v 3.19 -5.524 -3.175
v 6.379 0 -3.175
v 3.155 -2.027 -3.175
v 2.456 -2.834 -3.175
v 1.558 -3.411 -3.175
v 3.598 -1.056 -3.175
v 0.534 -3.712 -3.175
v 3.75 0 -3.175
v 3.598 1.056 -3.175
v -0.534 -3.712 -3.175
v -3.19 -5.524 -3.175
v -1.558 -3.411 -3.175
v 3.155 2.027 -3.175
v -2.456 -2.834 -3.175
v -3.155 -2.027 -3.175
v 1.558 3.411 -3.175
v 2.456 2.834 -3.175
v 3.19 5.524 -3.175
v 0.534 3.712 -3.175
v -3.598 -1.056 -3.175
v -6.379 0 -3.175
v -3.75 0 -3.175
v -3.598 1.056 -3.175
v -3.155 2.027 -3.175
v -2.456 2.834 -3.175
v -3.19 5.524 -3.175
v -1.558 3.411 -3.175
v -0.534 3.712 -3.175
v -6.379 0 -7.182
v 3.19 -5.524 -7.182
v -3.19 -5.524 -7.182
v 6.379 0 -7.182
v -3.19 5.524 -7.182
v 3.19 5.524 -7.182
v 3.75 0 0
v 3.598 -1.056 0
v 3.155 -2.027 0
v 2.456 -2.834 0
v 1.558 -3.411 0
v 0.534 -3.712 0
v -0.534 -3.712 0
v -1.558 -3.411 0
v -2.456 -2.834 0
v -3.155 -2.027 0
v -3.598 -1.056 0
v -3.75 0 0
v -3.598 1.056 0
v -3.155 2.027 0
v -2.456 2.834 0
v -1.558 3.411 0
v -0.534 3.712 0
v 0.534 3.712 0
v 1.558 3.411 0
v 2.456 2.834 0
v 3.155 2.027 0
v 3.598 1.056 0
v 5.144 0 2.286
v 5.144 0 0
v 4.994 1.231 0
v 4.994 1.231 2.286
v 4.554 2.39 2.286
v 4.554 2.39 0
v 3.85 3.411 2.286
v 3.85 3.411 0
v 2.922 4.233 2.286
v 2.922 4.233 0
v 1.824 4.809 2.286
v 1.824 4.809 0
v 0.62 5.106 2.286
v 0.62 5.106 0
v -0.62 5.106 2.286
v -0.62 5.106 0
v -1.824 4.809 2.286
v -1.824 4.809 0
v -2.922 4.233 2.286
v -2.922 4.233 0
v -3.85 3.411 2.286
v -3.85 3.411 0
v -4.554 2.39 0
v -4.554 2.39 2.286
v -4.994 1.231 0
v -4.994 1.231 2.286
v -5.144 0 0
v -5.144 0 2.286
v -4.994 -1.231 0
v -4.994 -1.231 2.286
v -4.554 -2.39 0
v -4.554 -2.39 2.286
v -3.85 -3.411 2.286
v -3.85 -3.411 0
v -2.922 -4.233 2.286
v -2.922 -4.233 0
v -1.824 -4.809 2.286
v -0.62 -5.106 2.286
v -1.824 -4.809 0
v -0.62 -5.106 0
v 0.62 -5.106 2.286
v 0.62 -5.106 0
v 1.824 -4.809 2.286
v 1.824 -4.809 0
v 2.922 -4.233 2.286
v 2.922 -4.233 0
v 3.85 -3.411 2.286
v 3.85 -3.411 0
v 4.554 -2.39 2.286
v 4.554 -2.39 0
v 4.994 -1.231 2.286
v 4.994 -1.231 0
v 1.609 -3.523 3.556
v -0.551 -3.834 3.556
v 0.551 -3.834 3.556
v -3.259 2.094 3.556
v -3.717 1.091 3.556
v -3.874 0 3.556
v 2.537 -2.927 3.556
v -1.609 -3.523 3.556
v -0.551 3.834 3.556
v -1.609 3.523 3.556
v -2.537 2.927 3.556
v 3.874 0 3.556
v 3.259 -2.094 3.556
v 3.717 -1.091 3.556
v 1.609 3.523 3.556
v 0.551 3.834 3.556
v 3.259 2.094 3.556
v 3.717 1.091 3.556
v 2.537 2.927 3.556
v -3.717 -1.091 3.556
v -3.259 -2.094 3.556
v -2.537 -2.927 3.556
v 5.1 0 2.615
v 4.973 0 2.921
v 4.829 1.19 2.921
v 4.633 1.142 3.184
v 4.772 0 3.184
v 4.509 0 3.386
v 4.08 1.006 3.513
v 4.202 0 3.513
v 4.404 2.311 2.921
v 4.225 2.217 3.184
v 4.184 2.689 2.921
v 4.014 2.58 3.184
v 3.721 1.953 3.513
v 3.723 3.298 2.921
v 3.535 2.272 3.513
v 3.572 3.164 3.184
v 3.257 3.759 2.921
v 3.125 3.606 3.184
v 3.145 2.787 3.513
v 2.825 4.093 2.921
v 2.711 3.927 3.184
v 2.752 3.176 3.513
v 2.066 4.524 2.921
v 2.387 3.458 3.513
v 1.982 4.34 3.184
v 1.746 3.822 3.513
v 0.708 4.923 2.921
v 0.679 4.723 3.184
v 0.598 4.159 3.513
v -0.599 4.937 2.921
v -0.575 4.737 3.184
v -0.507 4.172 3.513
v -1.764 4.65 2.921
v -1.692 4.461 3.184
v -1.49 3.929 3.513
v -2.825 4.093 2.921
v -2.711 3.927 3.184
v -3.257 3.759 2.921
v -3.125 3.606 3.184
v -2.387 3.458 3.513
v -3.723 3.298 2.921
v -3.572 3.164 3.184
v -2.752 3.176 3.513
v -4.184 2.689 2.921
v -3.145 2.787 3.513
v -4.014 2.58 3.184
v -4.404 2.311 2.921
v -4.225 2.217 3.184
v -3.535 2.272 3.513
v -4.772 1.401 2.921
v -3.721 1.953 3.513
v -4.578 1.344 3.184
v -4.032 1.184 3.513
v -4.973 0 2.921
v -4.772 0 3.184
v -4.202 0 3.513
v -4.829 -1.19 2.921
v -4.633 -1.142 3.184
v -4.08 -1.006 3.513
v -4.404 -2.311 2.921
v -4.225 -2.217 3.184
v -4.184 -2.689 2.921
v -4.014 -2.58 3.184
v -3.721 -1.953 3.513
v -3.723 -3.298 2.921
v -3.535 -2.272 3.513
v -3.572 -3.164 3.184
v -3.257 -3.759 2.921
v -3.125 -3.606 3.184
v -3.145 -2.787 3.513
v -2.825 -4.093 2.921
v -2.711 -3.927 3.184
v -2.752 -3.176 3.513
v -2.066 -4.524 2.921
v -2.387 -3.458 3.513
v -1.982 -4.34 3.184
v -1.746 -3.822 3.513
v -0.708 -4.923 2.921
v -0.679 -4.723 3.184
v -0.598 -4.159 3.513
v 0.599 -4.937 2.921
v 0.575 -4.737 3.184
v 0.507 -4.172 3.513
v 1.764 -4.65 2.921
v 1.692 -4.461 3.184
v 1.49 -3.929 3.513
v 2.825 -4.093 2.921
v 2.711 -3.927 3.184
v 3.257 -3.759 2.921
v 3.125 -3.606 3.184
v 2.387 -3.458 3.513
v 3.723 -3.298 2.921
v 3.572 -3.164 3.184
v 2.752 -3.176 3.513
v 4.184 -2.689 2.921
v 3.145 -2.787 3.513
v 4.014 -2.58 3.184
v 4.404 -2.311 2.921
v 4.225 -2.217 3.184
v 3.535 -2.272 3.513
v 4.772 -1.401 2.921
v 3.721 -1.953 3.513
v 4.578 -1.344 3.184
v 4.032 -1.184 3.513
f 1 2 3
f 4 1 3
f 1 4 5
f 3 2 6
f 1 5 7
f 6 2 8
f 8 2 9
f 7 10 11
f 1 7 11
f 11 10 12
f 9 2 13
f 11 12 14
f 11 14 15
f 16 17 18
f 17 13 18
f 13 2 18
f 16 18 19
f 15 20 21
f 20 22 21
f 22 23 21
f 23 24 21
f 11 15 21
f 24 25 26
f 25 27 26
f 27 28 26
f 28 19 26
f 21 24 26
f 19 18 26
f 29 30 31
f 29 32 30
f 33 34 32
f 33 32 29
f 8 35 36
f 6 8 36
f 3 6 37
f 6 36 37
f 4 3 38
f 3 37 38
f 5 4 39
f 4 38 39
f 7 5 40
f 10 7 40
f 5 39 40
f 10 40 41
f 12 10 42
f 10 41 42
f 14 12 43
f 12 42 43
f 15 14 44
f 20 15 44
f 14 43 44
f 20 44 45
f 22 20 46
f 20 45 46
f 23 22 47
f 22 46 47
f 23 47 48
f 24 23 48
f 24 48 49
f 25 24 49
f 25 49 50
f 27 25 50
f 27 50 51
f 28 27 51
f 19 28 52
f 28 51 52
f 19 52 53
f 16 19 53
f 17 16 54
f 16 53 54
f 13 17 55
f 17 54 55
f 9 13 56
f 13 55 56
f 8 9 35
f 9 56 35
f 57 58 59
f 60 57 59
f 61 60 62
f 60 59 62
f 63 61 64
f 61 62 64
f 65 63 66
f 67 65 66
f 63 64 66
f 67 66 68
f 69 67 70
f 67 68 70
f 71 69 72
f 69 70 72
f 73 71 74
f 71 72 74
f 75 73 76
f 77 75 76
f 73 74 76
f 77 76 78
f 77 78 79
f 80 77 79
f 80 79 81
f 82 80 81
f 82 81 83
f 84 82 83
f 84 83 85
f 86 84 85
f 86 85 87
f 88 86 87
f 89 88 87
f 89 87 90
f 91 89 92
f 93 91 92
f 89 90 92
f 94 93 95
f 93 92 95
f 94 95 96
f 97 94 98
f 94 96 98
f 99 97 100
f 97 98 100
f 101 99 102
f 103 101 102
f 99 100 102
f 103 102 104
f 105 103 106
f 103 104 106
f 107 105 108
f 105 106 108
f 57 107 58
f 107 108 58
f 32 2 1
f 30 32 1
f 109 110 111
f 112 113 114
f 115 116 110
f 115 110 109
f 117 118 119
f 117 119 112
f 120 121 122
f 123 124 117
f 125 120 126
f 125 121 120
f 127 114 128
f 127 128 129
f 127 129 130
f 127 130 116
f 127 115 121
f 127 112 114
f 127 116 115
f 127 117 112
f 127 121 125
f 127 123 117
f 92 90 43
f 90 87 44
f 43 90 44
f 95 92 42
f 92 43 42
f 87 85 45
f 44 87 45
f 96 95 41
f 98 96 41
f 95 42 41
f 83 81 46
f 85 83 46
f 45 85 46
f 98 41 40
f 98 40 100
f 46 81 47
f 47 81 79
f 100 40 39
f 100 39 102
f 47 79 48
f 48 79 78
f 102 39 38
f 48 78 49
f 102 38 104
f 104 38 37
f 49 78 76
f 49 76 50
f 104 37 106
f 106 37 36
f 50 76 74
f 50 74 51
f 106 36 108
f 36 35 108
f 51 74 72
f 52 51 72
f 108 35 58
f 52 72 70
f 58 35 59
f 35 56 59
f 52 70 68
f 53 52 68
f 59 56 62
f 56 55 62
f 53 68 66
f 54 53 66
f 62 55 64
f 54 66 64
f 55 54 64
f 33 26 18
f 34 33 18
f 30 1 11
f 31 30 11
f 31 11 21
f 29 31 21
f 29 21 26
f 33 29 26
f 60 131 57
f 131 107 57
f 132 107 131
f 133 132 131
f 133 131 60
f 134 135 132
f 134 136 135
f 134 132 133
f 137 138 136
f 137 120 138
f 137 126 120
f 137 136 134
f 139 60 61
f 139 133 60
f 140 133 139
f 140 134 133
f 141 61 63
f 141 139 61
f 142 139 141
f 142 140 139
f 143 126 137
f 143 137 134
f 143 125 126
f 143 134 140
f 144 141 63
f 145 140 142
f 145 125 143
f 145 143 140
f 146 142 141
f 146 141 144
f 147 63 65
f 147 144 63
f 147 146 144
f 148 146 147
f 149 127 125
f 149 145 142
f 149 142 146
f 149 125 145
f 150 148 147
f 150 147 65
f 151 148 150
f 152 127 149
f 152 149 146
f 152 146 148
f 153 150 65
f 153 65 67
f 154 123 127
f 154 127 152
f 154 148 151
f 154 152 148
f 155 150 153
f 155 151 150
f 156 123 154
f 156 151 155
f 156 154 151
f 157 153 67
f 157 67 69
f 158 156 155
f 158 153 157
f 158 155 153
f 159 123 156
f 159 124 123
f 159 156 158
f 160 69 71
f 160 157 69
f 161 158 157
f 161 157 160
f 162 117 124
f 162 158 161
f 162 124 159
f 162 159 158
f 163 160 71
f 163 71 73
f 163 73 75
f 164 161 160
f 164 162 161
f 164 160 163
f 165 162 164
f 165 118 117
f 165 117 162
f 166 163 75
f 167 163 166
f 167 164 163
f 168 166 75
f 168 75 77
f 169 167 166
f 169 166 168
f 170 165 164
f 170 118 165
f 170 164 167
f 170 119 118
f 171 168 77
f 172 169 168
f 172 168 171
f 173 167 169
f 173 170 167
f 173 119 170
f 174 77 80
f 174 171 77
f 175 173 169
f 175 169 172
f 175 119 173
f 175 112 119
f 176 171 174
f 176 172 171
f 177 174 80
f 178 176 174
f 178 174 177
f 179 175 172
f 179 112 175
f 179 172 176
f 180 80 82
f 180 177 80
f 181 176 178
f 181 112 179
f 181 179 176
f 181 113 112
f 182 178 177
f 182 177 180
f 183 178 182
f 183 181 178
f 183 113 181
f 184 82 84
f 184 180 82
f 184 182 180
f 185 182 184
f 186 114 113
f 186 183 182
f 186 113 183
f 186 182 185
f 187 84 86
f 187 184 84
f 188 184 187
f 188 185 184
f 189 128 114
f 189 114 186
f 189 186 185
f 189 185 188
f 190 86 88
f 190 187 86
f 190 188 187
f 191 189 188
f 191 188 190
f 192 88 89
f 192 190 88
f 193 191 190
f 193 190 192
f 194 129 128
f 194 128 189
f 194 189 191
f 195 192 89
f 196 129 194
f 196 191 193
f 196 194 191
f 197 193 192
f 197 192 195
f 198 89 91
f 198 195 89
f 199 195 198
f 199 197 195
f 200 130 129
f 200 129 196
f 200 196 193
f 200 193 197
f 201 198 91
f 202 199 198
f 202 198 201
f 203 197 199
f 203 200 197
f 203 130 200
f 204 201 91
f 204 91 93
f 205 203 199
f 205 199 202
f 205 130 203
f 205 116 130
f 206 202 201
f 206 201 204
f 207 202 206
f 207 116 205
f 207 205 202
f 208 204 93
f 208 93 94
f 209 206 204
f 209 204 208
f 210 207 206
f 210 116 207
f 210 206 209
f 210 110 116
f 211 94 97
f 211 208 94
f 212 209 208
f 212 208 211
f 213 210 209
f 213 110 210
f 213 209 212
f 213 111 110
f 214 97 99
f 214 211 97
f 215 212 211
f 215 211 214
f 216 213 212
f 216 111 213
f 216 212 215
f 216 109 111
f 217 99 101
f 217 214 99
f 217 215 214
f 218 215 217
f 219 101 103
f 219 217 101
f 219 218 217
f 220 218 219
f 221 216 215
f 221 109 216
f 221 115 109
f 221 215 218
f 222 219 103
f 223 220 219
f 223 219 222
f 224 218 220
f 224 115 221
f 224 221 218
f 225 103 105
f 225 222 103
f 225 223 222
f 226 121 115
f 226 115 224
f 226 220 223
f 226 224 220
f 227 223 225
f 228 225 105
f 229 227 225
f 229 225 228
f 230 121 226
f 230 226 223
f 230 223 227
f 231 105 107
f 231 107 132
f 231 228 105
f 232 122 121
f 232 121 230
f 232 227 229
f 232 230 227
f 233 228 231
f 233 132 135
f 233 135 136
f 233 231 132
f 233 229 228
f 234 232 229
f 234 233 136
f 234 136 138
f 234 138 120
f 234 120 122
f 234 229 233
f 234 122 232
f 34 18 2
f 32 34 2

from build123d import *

# Parameters (mm, degrees)
SKETCH1_R      = 5.1435
EXTRUDE1_DEPTH = 3.556
SKETCH2_R      = 3.75
EXTRUDE2_DEPTH = 3.175
EXTRUDE3_DEPTH = 4.007423572
FILLET1_R      = 1.27


with BuildPart() as part:
    # Sketch1 → Extrude1 (new body)
    with BuildSketch(Plane.XY):
        Circle(SKETCH1_R)
    extrude(amount=EXTRUDE1_DEPTH)

    # Sketch2 → Extrude2 (add)
    with BuildSketch(Plane(origin=(0, 0, 0), x_dir=(-1, 0, 0), z_dir=(0, 0, -1))):
        with Locations(Location((0, 0, 0), (0, 0, 180))):
            Circle(SKETCH2_R)
    extrude(amount=EXTRUDE2_DEPTH)

    # Sketch3 → Extrude3 (add)
    with BuildSketch(Plane(origin=(0, 0, -3.175), x_dir=(-1, 0, 0), z_dir=(0, 0, -1))):
        Polygon((-3.189571562, -5.5245), (3.189571562, -5.5245), (6.379143124, 0), (3.189571562, 5.5245), (-3.189571562, 5.5245), (-6.379143124, 0), align=None)
    extrude(amount=EXTRUDE3_DEPTH)

    # Fillet1
    fillet1_edges = [part.edges().sort_by_distance(p)[0] for p in [
        (-5.1435, 0, 3.556),
    ]]
    fillet(fillet1_edges, radius=FILLET1_R)


solid = part.part
